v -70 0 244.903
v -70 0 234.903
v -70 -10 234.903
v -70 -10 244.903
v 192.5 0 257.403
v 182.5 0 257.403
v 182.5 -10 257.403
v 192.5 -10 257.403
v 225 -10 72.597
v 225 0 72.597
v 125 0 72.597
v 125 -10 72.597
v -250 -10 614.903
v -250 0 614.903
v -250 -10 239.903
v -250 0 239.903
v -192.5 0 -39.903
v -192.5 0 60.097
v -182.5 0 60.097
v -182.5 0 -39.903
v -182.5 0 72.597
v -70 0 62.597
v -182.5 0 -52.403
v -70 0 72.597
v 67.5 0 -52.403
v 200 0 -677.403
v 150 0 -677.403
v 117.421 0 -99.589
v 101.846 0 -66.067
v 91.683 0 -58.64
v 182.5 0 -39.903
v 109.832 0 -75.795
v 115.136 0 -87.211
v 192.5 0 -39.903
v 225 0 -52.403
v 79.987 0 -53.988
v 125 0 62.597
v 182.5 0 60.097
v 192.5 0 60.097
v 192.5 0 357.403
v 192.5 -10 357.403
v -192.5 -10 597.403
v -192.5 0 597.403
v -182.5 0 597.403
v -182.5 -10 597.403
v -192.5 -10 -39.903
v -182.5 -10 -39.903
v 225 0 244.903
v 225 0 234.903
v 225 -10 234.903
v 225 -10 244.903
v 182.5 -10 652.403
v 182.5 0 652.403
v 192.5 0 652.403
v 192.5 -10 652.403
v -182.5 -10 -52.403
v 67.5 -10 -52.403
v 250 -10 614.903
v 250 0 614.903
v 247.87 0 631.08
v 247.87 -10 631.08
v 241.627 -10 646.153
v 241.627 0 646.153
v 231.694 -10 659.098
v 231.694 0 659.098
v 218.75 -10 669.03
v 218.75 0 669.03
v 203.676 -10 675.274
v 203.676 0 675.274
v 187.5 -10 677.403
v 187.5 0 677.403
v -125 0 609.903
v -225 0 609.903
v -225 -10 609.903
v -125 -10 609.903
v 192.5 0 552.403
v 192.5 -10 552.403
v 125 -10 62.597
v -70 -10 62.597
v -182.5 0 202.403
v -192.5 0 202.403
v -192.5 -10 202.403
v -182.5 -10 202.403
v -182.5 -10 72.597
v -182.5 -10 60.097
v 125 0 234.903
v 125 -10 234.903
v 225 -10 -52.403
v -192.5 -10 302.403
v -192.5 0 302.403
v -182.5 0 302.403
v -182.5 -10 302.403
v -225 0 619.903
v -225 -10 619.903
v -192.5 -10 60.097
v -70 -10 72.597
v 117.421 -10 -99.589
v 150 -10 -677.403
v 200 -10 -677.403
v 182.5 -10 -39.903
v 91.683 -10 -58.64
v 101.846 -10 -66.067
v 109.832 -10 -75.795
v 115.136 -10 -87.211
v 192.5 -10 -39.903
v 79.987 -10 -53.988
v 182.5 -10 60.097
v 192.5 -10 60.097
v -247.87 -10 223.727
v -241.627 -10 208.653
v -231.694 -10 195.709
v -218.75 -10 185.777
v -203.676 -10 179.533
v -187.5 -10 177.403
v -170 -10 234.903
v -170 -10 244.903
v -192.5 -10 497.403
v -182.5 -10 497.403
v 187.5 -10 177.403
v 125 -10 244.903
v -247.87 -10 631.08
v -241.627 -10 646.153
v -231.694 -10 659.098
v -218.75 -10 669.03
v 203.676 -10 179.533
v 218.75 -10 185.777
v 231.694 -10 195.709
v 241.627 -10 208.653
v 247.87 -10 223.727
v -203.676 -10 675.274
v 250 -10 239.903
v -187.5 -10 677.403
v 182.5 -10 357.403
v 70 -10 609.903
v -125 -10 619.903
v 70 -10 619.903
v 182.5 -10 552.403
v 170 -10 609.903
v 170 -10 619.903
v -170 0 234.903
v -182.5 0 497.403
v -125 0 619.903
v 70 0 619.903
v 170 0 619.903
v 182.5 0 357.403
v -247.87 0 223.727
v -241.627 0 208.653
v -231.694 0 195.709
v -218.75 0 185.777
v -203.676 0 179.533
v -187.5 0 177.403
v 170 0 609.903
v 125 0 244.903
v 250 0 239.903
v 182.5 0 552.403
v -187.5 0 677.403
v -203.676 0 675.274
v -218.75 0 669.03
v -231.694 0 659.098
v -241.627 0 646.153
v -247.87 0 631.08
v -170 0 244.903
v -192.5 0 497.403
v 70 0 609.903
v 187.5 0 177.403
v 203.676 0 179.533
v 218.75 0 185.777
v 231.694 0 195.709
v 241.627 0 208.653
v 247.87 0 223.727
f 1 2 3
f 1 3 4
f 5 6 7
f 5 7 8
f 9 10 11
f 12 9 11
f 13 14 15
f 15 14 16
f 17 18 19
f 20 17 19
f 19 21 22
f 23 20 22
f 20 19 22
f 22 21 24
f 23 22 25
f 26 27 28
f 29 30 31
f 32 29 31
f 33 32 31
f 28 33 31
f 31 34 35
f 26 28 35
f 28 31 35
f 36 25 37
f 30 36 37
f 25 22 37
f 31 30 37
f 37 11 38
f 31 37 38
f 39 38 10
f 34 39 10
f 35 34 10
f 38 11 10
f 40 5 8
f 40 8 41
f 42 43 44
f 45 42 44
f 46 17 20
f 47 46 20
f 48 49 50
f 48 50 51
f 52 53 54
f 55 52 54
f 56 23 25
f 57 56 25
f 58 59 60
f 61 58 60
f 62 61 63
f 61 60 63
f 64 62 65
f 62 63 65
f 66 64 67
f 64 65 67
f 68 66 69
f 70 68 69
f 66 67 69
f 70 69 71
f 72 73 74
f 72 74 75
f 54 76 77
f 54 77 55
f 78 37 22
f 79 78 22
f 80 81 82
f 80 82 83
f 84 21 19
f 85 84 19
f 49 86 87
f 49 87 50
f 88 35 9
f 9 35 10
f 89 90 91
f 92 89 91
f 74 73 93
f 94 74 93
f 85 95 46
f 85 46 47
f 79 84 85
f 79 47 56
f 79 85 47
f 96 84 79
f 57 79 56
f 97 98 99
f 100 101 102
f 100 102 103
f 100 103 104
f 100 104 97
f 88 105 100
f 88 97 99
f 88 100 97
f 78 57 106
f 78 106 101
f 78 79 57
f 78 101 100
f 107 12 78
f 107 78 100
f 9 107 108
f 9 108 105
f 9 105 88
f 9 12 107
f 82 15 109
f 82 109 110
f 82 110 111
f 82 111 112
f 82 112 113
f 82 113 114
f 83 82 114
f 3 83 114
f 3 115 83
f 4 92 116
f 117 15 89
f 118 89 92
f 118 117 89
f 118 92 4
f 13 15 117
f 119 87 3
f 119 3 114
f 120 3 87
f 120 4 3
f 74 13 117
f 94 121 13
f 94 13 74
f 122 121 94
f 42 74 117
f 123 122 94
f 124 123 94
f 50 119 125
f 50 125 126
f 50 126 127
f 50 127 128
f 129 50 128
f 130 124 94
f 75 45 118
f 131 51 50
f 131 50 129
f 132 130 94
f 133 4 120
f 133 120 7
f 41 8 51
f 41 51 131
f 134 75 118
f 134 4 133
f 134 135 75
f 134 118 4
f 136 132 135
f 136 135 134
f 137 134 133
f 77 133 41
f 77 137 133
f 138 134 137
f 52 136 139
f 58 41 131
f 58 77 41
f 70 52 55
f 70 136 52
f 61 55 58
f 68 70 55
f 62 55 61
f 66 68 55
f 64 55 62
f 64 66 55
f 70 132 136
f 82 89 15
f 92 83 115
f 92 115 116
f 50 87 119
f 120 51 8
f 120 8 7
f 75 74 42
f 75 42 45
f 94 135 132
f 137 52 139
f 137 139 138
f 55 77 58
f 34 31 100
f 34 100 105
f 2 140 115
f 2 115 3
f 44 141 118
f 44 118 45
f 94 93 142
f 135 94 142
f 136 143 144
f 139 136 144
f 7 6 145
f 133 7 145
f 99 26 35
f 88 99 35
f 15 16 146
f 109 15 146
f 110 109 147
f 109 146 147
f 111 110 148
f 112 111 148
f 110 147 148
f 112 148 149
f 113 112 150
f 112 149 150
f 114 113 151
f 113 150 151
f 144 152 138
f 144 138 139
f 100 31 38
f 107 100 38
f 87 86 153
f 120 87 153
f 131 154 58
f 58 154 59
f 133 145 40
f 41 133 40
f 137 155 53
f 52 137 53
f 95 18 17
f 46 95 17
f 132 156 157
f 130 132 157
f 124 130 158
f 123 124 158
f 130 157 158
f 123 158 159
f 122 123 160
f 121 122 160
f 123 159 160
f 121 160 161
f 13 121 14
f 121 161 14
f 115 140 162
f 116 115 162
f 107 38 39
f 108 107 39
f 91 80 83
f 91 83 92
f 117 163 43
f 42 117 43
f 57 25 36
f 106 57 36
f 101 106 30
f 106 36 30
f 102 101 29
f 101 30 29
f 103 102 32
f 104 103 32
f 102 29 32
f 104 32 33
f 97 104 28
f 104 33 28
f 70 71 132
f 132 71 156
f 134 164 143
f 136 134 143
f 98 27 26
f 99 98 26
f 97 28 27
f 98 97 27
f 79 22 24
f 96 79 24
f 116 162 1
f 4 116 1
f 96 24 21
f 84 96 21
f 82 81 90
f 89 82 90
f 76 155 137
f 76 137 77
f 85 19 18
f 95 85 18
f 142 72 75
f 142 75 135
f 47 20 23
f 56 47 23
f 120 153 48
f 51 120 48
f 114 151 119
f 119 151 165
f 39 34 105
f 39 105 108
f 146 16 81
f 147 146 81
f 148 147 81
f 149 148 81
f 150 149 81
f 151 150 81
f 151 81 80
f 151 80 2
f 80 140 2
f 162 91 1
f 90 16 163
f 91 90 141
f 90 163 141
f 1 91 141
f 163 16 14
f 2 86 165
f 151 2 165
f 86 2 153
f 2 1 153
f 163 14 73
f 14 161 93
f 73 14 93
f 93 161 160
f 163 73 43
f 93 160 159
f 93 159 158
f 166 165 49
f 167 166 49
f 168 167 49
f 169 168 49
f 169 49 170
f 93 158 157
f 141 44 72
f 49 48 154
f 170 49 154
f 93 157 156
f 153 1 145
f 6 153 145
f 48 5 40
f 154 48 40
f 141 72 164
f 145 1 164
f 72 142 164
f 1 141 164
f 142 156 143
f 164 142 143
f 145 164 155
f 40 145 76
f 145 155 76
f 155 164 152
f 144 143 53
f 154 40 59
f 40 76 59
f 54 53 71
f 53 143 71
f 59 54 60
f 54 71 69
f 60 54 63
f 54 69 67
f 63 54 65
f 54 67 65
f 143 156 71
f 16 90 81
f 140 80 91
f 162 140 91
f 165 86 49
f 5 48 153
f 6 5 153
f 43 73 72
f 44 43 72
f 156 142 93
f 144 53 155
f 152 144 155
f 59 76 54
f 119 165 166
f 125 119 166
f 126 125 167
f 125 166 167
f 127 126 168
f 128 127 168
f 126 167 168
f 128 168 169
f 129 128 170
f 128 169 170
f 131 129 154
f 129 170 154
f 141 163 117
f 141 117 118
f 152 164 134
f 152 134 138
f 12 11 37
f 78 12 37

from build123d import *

# Parameters (mm, degrees)
F0_W     = 10
F0_H     = 100
F0_W_2   = 100
F0_H_2   = 10
F1_DEPTH = 10


with BuildPart() as f1:
    # F0 (on Front) → F1 (new body)
    with BuildSketch(Plane.XZ):
        with BuildLine():
            Line((0, 677.403411), (-187.5, 677.403411))
            ThreePointArc((-187.5, 677.403411), (-231.694174, 659.097585), (-250, 614.903411))
            Line((-250, 614.903411), (-250, 427.403411))
            Line((-250, 427.403411), (0, 427.403411))
            Line((0, 427.403411), (0, 677.403411))
        make_face()
        with Locations((-187.5, 547.403411)):
            Rectangle(F0_W, F0_H, mode=Mode.SUBTRACT)
        with Locations((-175, 614.903411)):
            Rectangle(F0_W_2, F0_H_2, mode=Mode.SUBTRACT)
        with BuildLine():
            Line((187.5, 677.403411), (0, 677.403411))
            Line((0, 677.403411), (0, 427.403411))
            Line((0, 427.403411), (250, 427.403411))
            Line((250, 427.403411), (250, 614.903411))
            ThreePointArc((250, 614.903411), (231.694174, 659.097585), (187.5, 677.403411))
        make_face()
        with Locations((120, 614.903411)):
            Rectangle(F0_W_2, F0_H_2, mode=Mode.SUBTRACT)
        with Locations((187.5, 602.403411)):
            Rectangle(F0_W, F0_H, mode=Mode.SUBTRACT)
        with BuildLine():
            Line((0, 177.403411), (0, 427.403411))
            Line((0, 427.403411), (-250, 427.403411))
            Line((-250, 427.403411), (-250, 239.903411))
            ThreePointArc((-250, 239.903411), (-231.694174, 195.709237), (-187.5, 177.403411))
            Line((-187.5, 177.403411), (0, 177.403411))
        make_face()
        with Locations((-187.5, 252.403411)):
            Rectangle(F0_W, F0_H, mode=Mode.SUBTRACT)
        with Locations((-120, 239.903411)):
            Rectangle(F0_W_2, F0_H_2, mode=Mode.SUBTRACT)
        with BuildLine():
            Line((250, 427.403411), (0, 427.403411))
            Line((0, 427.403411), (0, 177.403411))
            Line((0, 177.403411), (187.5, 177.403411))
            ThreePointArc((187.5, 177.403411), (231.694174, 195.709237), (250, 239.903411))
            Line((250, 239.903411), (250, 427.403411))
        make_face()
        with Locations((175, 239.903411)):
            Rectangle(F0_W_2, F0_H_2, mode=Mode.SUBTRACT)
        with Locations((187.5, 307.403411)):
            Rectangle(F0_W, F0_H, mode=Mode.SUBTRACT)
        with BuildLine():
            Line((125, 72.596589), (125, 62.596589))
            Line((125, 62.596589), (-70, 62.596589))
            Line((-70, 62.596589), (-70, 72.596589))
            Line((-70, 72.596589), (-182.5, 72.596589))
            Line((-182.5, 72.596589), (-182.5, 60.096589))
            Line((-182.5, 60.096589), (-192.5, 60.096589))
            Line((-192.5, 60.096589), (-192.5, -39.903411))
            Line((-192.5, -39.903411), (-182.5, -39.903411))
            Line((-182.5, -39.903411), (-182.5, -52.403411))
            Line((-182.5, -52.403411), (67.5, -52.403411))
            ThreePointArc((67.5, -52.403411), (101.845775, -66.066546), (117.420711, -99.5887))
            Line((117.420711, -99.5887), (150, -677.403411))
            Line((150, -677.403411), (200, -677.403411))
            Line((200, -677.403411), (225, -52.403411))
            Line((225, -52.403411), (225, 72.596589))
            Line((225, 72.596589), (125, 72.596589))
        make_face()
        with Locations((187.5, 10.096589)):
            Rectangle(F0_W, F0_H, mode=Mode.SUBTRACT)
    extrude(amount=F1_DEPTH)


solid = f1.part
